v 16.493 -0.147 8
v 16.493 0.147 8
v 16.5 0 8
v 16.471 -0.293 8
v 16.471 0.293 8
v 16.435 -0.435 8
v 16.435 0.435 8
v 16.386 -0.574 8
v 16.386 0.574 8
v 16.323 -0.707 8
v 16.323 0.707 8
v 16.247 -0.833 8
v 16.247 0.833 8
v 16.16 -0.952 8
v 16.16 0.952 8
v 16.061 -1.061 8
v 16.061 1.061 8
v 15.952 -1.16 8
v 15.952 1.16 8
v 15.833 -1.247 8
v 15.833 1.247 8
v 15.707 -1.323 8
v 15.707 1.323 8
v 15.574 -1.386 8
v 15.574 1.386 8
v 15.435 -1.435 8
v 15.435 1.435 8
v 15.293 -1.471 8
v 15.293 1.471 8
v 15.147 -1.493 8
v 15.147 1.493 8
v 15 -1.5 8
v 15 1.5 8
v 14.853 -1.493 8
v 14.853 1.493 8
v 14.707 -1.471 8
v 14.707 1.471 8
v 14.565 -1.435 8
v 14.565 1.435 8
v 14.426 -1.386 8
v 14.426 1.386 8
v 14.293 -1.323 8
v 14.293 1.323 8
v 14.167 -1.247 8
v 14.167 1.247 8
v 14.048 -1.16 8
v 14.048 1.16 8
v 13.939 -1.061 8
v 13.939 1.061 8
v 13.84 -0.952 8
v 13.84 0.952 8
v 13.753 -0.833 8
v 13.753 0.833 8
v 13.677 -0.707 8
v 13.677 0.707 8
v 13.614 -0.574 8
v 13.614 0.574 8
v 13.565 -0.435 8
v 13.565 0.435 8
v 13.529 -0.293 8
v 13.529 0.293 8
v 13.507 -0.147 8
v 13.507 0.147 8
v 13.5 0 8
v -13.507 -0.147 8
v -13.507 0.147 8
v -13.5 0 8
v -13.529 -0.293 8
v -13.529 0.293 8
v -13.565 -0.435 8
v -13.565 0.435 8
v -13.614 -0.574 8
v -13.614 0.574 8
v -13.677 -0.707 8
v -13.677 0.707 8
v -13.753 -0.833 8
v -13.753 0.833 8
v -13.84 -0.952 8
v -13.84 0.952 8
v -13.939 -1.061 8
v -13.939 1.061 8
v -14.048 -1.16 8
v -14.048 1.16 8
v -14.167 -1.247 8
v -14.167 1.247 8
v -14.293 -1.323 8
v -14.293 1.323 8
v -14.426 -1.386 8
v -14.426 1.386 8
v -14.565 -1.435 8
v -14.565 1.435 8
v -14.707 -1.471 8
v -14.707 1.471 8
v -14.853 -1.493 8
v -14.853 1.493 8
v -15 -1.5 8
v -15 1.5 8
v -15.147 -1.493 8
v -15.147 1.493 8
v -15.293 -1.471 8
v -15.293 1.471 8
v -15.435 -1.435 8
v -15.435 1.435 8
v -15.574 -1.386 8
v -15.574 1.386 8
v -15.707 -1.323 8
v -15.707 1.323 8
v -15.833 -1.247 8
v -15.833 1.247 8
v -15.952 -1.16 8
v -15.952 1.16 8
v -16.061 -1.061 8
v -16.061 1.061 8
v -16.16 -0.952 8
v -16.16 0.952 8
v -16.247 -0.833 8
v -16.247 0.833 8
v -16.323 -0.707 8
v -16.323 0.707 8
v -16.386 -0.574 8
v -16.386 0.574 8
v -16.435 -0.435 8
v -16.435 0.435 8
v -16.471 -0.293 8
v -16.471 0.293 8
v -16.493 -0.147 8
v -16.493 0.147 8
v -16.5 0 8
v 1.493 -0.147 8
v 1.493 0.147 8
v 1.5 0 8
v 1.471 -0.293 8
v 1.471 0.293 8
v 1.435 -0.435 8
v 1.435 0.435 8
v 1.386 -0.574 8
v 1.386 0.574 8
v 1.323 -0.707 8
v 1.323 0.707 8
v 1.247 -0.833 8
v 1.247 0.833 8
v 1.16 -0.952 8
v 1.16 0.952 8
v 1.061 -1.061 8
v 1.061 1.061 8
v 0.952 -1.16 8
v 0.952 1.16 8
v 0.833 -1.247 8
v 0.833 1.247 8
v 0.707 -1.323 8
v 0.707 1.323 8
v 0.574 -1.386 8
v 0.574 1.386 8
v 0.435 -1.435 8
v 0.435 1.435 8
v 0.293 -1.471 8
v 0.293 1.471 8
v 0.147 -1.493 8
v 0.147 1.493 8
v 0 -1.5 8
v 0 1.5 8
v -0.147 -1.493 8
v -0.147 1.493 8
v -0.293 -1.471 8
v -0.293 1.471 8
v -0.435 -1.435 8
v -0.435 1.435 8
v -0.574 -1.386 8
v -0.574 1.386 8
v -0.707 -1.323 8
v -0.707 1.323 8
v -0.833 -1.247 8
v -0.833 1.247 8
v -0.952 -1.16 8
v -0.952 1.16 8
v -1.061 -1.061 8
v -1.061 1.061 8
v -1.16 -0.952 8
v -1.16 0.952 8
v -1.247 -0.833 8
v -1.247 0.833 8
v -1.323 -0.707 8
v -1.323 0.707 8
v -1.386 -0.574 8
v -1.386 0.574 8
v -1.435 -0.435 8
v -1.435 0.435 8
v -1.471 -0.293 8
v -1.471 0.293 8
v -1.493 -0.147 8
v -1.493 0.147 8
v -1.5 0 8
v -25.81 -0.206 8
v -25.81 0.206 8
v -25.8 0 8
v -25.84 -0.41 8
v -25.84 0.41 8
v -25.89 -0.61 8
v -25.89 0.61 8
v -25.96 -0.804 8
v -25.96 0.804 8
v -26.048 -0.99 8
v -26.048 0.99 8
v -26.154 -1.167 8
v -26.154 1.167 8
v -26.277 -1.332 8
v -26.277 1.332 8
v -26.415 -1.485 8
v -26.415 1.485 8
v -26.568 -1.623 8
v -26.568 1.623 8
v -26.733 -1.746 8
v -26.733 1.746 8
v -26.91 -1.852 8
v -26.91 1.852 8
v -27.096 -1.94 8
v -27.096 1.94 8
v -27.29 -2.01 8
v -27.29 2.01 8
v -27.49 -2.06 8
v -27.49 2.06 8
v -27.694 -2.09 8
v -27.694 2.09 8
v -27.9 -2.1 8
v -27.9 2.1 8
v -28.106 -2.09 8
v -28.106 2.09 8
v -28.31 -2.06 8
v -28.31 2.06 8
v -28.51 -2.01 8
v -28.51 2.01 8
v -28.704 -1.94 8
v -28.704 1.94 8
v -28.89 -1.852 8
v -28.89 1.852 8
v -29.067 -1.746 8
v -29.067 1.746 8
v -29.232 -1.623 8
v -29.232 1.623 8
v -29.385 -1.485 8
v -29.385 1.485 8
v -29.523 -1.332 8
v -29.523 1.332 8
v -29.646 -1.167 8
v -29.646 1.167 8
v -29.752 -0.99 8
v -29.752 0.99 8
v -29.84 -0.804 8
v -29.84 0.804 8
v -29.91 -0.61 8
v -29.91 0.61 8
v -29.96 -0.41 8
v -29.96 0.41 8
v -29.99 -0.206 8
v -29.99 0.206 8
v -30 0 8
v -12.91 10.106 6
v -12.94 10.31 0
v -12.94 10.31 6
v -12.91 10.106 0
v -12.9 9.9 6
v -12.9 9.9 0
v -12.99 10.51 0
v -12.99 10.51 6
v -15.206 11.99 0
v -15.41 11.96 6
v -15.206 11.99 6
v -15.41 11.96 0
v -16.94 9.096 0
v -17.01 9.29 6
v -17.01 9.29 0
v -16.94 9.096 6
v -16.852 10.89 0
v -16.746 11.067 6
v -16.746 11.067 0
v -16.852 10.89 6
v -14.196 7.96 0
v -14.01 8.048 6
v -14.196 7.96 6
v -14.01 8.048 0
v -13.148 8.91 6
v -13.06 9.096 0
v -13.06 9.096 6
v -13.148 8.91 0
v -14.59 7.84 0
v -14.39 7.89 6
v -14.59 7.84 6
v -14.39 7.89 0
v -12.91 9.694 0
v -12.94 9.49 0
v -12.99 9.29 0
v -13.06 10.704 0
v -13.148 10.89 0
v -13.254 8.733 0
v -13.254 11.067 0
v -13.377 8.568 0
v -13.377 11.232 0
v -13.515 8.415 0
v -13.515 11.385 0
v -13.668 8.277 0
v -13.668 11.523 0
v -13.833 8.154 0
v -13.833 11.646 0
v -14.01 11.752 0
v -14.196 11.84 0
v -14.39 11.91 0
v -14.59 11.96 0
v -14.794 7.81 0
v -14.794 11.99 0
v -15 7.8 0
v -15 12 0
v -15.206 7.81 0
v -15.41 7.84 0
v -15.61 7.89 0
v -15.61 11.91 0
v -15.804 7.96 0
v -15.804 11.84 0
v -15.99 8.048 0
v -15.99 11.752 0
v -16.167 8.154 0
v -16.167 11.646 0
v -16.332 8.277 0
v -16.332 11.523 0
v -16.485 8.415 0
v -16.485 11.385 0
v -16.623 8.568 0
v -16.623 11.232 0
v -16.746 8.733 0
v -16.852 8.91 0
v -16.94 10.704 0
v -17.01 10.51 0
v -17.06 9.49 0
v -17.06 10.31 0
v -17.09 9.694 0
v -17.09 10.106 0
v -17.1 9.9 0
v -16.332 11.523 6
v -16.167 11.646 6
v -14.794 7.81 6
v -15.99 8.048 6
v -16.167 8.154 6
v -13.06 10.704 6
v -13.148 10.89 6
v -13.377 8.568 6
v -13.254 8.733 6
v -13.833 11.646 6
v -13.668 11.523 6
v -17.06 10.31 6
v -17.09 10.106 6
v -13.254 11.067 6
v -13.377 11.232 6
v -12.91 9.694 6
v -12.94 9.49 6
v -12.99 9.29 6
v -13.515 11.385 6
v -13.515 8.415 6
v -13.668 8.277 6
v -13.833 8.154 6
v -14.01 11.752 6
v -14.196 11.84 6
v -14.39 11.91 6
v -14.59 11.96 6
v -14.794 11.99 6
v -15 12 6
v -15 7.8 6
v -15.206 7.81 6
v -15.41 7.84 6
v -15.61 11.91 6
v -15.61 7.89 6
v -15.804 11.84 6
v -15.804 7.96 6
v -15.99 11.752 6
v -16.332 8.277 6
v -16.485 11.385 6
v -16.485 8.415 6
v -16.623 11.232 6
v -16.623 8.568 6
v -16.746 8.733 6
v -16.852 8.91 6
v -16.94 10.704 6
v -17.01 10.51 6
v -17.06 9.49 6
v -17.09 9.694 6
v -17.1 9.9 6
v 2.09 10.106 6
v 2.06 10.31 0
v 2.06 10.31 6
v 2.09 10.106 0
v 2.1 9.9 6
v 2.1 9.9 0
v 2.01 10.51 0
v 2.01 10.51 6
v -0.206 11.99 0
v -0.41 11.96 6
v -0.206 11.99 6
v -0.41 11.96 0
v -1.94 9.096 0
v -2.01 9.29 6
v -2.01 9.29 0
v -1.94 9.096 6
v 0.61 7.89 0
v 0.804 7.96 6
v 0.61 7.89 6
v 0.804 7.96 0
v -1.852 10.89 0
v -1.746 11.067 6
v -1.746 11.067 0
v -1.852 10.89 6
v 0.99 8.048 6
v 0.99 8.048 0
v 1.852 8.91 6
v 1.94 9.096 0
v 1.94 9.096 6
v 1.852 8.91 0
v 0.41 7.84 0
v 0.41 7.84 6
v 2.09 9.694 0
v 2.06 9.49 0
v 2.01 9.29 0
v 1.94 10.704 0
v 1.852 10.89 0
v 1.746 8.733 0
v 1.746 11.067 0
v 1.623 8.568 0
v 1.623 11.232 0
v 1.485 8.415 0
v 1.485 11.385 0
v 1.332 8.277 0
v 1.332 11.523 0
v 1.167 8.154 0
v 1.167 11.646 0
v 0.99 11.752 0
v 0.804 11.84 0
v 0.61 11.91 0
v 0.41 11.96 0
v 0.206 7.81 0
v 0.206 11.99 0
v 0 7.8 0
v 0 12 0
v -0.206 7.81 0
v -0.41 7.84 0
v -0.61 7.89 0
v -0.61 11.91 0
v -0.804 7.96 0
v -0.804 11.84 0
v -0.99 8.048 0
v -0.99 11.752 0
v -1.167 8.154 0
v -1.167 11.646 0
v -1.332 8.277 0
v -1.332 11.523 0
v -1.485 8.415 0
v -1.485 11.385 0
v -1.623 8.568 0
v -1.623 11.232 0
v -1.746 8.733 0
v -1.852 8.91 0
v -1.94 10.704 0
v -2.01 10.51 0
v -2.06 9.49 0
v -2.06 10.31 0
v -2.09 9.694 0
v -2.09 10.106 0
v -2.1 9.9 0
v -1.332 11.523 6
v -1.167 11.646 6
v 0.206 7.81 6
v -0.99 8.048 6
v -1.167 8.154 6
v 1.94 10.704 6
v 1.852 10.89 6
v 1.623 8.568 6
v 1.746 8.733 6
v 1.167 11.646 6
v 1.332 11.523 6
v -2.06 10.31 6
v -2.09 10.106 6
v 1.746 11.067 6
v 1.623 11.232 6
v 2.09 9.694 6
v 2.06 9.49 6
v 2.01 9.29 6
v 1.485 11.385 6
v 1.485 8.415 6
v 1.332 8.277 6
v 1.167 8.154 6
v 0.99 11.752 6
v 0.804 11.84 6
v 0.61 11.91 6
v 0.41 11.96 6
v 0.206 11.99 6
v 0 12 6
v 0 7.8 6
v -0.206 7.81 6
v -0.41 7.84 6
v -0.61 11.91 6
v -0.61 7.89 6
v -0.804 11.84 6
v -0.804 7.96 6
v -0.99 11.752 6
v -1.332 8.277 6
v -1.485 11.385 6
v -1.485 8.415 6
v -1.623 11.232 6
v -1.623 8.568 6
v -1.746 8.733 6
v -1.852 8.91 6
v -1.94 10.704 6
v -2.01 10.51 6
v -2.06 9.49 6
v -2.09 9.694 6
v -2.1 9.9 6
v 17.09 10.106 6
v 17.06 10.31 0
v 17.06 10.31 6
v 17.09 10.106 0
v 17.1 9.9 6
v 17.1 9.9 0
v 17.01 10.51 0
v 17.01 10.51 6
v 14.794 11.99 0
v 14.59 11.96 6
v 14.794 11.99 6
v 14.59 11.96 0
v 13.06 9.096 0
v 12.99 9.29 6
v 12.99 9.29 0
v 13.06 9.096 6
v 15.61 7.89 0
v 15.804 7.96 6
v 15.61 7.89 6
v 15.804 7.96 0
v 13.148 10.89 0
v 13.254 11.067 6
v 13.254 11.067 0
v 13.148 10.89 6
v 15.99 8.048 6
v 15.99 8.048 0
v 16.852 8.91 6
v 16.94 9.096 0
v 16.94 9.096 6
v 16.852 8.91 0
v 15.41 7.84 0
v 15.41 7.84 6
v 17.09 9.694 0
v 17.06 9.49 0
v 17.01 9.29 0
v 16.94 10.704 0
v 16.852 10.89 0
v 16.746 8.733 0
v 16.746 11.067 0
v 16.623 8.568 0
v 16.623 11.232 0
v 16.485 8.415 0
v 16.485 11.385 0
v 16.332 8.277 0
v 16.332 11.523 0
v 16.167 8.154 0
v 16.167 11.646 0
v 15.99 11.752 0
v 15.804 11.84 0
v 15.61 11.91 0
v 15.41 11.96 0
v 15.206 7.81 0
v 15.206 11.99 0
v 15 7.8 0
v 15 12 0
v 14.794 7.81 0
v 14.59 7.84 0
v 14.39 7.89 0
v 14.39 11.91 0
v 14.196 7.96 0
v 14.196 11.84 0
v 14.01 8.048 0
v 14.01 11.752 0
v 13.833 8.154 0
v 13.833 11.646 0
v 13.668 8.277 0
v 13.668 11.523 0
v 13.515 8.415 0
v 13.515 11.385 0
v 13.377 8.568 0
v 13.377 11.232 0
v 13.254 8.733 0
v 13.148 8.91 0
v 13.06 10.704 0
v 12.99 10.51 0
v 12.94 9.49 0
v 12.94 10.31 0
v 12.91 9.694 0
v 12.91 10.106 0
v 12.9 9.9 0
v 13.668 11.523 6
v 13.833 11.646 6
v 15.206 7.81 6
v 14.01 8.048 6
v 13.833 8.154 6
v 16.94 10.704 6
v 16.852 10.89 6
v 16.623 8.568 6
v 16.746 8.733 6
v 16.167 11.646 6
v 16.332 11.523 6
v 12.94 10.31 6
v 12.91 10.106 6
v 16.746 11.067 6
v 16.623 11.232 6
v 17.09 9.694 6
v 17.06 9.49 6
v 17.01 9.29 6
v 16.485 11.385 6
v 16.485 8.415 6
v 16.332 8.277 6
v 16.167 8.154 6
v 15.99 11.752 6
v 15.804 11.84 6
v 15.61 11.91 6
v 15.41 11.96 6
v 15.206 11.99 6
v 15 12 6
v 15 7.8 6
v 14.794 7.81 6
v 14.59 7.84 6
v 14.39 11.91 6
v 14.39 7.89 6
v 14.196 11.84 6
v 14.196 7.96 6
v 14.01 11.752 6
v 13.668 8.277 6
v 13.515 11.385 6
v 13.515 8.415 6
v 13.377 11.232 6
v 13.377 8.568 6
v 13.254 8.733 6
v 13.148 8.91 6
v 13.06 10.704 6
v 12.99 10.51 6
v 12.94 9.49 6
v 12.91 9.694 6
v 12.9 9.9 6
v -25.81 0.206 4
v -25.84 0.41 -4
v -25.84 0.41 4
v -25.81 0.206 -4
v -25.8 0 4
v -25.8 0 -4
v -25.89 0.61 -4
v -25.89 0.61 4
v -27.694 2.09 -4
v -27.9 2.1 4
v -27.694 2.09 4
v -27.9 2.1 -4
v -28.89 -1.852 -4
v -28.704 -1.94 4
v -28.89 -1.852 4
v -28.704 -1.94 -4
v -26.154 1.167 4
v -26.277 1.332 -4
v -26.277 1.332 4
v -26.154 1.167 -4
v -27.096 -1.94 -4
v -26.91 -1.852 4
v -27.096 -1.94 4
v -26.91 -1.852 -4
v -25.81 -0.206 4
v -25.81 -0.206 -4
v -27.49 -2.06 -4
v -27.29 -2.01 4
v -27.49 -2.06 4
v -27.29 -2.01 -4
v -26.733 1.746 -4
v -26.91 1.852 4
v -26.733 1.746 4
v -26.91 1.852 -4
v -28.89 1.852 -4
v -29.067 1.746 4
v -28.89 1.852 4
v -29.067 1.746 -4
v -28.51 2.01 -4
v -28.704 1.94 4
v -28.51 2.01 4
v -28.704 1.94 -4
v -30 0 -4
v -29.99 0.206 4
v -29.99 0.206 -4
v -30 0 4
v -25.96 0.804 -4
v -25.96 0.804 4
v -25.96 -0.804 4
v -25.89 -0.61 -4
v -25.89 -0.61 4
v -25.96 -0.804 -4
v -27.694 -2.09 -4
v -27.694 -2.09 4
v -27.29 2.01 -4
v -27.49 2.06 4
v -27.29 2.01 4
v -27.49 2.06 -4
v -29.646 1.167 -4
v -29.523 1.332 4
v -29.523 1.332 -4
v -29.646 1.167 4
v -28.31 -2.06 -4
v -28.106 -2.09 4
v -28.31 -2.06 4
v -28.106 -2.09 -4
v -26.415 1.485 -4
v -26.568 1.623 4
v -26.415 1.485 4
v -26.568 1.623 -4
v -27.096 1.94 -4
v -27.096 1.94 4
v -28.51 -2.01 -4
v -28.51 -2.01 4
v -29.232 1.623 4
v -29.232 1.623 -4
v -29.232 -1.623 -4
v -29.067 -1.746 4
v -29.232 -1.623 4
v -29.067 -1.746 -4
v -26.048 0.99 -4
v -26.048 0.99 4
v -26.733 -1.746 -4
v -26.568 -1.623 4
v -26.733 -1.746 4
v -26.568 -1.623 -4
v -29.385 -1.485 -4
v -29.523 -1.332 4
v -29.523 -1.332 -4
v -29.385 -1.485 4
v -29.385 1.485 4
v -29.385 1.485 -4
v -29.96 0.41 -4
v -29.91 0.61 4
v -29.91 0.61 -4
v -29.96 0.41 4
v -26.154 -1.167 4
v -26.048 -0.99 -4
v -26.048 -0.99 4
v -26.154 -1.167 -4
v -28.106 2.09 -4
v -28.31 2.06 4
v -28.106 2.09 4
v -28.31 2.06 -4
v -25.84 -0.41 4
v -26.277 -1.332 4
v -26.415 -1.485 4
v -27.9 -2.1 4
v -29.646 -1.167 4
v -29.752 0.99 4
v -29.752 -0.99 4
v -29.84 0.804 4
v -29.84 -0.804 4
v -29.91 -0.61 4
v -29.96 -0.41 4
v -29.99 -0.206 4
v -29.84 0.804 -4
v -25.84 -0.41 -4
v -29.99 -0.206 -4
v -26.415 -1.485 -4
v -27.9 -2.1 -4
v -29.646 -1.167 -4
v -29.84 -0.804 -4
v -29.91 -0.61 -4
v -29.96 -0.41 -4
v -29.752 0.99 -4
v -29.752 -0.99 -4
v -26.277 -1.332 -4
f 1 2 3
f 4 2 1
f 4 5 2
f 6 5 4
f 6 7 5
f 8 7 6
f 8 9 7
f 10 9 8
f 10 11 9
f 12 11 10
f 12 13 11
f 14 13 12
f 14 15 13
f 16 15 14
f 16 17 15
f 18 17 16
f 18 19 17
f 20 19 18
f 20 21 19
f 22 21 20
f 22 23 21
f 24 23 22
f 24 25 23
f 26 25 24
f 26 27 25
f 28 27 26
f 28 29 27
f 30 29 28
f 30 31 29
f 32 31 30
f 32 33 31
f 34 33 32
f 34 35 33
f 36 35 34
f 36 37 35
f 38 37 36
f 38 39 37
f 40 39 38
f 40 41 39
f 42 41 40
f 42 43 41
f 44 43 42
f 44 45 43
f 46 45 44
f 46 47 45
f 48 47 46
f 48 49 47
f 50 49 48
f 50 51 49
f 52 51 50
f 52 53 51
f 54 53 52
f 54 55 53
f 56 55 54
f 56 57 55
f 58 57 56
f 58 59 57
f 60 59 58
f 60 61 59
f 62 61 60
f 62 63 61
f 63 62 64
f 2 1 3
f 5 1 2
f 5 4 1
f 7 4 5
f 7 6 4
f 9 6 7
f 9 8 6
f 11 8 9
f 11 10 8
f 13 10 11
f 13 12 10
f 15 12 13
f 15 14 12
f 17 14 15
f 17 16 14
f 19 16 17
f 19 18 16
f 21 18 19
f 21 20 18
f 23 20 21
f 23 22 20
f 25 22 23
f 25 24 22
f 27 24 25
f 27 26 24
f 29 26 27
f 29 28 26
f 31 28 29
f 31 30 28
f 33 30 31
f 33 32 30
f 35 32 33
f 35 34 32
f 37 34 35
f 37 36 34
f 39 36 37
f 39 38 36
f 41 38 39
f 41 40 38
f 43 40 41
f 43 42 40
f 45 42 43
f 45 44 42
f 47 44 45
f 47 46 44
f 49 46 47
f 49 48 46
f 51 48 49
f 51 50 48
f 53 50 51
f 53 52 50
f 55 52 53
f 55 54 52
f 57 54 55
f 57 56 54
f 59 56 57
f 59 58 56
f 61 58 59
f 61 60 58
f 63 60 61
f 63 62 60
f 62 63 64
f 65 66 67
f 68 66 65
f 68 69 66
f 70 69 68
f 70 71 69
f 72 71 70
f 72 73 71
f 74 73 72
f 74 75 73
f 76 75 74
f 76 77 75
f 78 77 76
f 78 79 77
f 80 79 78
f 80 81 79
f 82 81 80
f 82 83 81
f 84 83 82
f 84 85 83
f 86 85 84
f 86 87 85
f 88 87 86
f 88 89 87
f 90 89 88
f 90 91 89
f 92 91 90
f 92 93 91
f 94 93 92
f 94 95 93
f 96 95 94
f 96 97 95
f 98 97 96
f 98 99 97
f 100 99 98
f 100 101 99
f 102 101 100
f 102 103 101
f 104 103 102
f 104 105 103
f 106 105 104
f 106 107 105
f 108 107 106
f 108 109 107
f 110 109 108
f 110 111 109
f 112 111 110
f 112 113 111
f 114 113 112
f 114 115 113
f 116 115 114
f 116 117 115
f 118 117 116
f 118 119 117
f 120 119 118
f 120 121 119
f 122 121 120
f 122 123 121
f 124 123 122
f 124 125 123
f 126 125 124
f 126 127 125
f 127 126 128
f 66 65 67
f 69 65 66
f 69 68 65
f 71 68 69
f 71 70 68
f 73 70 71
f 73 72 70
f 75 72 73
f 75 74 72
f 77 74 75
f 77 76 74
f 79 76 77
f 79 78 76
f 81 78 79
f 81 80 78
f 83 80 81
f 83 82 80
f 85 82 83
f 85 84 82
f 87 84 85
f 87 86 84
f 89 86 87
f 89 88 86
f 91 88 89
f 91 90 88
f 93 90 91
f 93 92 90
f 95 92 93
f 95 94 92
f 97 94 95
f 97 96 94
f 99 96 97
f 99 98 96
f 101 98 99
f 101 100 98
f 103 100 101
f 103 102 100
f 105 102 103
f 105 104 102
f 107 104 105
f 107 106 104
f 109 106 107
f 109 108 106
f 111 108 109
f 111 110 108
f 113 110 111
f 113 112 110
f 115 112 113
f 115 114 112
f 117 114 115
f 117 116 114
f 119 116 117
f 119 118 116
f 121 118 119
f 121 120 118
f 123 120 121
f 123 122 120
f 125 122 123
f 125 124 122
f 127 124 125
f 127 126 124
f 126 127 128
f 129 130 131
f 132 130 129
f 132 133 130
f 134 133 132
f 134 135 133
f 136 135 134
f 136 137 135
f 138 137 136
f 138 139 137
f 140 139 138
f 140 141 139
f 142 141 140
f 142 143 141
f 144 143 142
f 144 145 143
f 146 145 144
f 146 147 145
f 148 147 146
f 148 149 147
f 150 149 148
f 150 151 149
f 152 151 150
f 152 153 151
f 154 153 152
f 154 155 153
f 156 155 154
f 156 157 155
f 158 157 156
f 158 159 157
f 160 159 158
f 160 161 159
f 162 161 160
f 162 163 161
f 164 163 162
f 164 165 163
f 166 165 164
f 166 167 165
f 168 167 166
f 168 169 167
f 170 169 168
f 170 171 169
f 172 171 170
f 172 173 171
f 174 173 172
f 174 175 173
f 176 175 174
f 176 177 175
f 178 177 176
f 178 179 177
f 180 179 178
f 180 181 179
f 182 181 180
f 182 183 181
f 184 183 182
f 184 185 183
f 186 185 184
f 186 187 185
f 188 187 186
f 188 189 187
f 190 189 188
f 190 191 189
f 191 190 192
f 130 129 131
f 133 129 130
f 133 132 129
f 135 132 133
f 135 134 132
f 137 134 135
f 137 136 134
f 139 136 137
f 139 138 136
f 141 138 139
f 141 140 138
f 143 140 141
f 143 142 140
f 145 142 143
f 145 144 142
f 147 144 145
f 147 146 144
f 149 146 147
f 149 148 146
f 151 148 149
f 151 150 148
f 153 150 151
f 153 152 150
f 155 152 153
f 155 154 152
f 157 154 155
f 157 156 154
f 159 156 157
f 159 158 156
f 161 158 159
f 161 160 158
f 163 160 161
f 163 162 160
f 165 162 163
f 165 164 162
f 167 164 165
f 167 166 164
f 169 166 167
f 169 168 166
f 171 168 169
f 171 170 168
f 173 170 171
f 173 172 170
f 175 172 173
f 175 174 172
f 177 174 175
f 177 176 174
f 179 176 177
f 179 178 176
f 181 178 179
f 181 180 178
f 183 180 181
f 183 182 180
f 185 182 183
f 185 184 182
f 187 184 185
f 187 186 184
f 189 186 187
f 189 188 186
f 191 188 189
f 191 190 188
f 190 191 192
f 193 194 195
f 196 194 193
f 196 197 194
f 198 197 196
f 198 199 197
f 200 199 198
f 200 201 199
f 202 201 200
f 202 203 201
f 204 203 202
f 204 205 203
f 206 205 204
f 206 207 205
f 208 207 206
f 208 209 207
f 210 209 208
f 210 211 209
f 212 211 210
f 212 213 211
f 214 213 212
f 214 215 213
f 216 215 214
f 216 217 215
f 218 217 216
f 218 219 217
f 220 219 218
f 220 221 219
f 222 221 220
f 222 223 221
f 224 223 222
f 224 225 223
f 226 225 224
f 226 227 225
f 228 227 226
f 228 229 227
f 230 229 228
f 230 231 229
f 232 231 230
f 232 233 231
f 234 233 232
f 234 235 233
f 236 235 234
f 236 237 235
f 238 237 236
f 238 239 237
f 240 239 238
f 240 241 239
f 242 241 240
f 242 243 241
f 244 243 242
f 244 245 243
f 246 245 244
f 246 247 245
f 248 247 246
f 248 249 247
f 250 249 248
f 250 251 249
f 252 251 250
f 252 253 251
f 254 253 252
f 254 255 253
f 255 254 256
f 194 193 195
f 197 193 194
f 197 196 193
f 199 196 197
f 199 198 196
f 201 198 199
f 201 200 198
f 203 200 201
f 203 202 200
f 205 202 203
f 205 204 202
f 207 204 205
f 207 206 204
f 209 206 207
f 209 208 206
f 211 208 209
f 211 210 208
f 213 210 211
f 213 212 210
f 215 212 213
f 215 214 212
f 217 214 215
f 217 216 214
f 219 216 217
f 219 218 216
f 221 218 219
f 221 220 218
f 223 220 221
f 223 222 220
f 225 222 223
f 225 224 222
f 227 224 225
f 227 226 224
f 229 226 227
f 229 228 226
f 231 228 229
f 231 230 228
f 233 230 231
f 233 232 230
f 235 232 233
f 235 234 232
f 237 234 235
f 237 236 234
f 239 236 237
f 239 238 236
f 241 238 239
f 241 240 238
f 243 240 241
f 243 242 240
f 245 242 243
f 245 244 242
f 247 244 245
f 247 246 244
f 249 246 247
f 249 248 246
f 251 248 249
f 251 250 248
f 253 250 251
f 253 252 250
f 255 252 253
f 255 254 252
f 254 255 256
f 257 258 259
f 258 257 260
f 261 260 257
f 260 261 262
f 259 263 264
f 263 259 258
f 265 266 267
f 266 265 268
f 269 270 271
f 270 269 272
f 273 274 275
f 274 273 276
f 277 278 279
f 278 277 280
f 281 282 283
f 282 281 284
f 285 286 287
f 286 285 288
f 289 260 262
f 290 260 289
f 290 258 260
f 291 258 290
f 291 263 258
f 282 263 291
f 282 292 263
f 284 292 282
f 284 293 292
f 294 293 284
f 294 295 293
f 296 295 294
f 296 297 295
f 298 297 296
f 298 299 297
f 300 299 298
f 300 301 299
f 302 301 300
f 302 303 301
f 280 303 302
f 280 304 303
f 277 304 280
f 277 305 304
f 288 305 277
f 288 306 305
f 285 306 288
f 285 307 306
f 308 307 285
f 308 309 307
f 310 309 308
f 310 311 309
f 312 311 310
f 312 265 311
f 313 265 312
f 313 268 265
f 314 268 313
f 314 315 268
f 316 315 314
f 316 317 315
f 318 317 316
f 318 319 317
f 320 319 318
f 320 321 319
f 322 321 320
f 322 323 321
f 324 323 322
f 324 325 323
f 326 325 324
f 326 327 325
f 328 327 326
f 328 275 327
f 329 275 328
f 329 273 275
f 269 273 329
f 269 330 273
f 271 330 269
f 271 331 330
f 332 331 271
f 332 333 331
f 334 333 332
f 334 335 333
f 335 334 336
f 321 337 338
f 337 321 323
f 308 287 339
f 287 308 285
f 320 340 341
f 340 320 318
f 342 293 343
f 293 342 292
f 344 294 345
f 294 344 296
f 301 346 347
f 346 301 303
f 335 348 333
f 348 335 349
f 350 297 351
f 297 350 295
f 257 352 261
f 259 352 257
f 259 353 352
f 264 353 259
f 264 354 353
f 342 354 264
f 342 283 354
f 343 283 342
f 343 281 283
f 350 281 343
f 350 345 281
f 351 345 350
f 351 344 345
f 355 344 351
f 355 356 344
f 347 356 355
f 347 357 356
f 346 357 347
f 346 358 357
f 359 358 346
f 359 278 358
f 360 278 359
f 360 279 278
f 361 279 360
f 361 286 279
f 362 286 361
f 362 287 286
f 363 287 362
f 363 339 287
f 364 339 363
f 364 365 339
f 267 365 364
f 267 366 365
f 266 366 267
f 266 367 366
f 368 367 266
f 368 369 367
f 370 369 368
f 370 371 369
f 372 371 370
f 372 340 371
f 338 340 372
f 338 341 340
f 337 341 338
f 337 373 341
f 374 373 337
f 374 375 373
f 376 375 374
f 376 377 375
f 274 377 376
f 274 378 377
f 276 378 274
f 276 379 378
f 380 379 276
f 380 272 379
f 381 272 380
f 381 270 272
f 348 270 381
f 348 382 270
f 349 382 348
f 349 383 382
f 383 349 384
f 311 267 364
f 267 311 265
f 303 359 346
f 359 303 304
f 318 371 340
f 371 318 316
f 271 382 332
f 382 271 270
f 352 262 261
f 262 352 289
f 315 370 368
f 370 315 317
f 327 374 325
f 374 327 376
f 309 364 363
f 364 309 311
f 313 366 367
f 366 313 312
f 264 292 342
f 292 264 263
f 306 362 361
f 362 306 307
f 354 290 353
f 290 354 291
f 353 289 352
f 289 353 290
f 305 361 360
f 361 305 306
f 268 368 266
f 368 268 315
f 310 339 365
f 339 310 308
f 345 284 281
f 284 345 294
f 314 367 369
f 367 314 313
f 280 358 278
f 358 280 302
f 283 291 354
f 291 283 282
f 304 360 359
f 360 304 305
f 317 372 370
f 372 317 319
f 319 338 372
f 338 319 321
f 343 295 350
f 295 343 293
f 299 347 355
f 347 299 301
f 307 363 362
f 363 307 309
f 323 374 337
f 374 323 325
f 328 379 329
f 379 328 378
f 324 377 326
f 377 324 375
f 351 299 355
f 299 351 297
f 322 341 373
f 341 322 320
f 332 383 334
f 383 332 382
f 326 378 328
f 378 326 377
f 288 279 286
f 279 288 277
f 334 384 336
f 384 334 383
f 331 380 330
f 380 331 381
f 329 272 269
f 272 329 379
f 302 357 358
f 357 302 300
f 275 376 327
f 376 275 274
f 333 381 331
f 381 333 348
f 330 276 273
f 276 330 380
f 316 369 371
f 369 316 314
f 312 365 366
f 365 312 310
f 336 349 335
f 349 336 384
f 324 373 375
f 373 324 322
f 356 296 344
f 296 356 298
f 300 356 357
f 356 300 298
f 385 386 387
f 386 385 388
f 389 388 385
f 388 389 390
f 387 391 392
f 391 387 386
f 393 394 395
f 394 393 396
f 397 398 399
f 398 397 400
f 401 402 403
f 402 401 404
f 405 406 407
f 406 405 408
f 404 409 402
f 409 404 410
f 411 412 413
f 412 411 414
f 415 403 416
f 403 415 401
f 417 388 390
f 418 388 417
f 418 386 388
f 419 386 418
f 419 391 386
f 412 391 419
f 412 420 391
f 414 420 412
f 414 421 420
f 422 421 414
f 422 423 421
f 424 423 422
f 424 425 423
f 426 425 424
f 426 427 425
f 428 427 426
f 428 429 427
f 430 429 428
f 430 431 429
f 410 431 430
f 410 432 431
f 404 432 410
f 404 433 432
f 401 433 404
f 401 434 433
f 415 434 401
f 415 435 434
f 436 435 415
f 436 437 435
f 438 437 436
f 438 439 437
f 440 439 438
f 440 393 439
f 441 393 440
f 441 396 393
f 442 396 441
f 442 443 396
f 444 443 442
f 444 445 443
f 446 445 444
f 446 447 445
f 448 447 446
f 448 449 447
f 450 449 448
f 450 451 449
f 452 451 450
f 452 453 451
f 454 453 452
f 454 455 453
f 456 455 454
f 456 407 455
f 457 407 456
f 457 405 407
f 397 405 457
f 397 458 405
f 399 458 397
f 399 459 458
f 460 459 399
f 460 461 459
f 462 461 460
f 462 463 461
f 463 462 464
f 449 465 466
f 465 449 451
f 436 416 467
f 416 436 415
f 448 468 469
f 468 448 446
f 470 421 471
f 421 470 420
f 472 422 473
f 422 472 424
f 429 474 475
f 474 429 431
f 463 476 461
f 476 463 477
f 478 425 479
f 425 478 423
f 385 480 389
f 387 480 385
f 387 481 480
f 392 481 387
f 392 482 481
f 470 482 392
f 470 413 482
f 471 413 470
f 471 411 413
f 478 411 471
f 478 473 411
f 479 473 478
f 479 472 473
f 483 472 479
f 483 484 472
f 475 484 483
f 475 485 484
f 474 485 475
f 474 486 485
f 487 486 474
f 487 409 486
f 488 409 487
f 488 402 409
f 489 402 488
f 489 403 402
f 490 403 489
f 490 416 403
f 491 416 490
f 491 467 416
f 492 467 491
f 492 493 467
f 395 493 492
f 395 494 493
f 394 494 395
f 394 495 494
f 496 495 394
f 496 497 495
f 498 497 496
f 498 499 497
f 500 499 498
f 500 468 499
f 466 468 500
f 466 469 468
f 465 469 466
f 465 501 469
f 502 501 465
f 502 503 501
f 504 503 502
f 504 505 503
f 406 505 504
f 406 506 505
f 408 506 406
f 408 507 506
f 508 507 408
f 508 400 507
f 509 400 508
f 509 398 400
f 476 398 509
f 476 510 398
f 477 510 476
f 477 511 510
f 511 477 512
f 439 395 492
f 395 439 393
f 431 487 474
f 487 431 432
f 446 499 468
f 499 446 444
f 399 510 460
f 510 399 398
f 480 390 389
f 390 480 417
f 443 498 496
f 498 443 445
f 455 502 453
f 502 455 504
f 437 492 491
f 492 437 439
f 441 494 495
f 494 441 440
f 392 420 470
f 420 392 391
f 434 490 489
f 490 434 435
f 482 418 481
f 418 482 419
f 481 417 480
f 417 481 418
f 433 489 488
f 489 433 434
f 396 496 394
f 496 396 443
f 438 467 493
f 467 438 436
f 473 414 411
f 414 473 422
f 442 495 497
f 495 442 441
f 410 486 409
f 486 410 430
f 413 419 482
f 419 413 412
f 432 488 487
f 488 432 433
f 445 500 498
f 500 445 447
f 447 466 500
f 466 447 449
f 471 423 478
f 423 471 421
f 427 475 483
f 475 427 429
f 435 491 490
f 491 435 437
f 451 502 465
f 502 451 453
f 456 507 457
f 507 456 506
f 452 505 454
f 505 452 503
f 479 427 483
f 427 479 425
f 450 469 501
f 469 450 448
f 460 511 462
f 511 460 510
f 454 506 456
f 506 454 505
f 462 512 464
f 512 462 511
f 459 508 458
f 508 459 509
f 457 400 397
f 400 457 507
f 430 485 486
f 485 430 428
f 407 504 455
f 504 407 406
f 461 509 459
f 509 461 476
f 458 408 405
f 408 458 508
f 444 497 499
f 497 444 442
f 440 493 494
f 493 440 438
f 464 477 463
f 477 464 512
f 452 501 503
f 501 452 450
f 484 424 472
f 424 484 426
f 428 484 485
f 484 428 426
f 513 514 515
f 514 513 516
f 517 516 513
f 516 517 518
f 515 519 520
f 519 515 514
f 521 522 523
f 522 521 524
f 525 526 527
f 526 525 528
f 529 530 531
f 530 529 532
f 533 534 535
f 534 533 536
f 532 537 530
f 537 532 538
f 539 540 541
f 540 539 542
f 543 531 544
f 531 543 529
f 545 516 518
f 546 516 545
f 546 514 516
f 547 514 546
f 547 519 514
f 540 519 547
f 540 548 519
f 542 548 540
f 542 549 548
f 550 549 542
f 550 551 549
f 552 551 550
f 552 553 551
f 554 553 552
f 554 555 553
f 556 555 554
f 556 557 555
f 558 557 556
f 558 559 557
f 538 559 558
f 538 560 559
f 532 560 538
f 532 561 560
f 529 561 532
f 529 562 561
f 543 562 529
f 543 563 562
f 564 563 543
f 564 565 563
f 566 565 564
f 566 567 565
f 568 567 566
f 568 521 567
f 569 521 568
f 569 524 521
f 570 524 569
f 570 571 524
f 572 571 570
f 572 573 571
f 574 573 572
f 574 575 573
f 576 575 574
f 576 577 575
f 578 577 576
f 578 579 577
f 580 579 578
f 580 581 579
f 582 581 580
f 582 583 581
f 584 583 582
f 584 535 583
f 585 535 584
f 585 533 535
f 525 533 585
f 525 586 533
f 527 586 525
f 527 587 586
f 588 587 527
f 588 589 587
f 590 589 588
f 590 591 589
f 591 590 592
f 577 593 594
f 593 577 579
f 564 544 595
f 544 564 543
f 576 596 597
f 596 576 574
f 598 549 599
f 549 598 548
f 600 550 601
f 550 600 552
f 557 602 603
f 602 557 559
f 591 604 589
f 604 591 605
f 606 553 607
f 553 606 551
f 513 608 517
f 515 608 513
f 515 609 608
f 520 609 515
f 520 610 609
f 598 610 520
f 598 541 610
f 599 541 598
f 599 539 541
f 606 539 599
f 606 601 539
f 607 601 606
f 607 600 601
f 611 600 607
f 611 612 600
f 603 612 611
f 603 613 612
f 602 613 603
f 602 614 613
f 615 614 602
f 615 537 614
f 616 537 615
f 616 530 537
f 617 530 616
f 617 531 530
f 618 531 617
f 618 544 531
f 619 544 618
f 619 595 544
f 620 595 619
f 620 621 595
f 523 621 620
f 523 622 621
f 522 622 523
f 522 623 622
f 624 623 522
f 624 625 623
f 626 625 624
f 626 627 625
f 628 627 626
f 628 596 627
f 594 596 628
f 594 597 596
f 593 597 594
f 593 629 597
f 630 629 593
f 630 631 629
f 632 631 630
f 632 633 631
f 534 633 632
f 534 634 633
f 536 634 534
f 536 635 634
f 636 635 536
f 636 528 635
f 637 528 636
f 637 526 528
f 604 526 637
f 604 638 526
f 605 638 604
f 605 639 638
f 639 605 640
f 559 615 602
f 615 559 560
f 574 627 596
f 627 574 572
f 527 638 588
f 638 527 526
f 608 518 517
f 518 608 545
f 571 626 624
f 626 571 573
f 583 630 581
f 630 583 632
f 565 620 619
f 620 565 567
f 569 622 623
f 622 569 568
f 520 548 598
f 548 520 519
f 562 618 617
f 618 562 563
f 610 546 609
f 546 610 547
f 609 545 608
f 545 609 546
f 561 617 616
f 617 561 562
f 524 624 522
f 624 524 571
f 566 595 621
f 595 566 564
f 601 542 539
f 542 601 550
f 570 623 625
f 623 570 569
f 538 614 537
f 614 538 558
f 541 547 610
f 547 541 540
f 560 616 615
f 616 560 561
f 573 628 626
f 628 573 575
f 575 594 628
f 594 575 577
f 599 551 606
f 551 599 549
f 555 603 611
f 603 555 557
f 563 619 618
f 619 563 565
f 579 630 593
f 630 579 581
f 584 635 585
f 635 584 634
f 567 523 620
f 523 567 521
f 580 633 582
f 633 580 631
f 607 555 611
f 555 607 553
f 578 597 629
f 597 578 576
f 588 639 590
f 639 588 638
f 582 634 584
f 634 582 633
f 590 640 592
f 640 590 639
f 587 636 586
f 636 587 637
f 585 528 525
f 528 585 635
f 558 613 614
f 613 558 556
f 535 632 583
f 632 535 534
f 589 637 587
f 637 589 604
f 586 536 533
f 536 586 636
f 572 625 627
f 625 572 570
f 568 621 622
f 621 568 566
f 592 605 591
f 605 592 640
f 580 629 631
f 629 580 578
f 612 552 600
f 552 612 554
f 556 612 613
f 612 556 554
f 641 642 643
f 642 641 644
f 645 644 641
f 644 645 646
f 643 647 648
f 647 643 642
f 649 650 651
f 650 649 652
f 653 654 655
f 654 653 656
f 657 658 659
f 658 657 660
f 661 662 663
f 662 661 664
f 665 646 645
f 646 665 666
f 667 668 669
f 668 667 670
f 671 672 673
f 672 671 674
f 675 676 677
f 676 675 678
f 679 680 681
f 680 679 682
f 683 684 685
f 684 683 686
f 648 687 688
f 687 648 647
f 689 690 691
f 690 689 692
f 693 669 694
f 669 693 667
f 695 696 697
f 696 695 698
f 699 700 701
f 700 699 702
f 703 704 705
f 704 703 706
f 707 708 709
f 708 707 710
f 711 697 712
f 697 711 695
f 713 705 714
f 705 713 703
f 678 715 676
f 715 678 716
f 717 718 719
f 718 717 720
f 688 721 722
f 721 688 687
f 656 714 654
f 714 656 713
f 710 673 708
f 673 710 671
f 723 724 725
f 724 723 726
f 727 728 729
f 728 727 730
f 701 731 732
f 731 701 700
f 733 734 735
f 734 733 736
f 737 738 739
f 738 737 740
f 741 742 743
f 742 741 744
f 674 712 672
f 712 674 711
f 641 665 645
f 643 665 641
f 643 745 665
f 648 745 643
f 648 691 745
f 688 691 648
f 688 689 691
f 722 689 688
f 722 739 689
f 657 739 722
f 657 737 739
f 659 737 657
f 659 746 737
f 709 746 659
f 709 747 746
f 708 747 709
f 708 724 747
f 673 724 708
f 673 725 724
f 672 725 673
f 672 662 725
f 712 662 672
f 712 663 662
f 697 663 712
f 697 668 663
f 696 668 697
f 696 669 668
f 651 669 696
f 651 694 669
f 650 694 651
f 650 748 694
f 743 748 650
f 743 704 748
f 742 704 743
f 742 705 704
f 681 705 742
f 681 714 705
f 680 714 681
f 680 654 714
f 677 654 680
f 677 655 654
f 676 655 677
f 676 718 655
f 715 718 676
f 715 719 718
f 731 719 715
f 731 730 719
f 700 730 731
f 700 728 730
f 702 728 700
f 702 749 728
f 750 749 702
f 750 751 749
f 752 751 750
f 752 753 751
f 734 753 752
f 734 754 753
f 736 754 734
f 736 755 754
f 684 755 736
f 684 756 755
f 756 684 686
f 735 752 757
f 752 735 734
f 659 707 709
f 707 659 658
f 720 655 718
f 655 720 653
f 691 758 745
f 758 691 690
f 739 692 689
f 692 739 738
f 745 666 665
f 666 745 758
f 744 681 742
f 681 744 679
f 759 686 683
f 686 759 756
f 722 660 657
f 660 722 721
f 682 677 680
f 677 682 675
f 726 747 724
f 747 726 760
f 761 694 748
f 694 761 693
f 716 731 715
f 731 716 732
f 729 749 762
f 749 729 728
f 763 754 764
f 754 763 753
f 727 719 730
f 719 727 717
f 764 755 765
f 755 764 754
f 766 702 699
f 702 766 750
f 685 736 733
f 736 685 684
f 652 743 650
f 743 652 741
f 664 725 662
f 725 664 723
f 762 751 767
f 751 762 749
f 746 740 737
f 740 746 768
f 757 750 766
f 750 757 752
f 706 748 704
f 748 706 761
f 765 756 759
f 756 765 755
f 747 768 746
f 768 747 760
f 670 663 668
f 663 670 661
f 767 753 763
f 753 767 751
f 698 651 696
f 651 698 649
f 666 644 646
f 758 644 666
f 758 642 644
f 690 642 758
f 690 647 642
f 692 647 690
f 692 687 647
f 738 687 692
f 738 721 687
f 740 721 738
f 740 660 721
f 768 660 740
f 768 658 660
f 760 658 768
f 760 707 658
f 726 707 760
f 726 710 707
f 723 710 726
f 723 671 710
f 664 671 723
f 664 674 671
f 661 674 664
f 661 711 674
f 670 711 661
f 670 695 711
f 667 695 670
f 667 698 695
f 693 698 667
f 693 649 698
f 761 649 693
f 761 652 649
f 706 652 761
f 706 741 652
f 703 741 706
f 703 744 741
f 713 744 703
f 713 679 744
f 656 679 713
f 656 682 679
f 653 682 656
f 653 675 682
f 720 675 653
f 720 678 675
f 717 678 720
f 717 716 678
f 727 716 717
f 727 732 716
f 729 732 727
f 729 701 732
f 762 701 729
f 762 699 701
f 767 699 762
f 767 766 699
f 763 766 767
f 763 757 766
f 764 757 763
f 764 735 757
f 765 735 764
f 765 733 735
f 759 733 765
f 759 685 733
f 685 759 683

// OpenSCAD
// --- Dimensions (mm) ---

// Block dimensions
block_length = 60;   // X dimension
block_width = 24;    // Y dimension
block_height = 16;   // Z dimension

// Tubing/Channel dimensions
tube_diameter = 3.0;  // Diameter of internal channels
inlet_socket_dia = 4.2; // Inlet socket diameter
outlet_socket_dia = 4.2; // Outlet socket diameter
inlet_depth = 8.0;    // Depth of inlet socket
outlet_depth = 6.0;   // Depth of outlet sockets

// Screw hole dimensions
screw_hole_diameter = 3.4; // Diameter for M3 screws
screw_hole_offset_x1 = -25; // X position of first screw hole (relative to center)
screw_hole_offset_x2 = 25;  // X position of second screw hole (relative to center)
screw_hole_y_pos = -6.0;    // Y position of both screw holes

// Channel positions and lengths
main_channel_stop_x = 15; // Where the main channel stops internally
outlet_branch_x1 = -15;  // X position for first outlet branch
outlet_branch_x2 = 0;    // X position for second outlet branch
outlet_branch_x3 = 15;   // X position for third outlet branch

// --- Constants ---
$fn = 64; // High resolution for curves

// --- Base Block ---
module block() {
    cube([block_length, block_width, block_height], center = true);
}

// --- Features ---

// 1. Inlet Socket (on -X face, y=0)
module inlet_socket() {
    translate([-block_length/2 + (inlet_socket_dia / 2), 0, 0]) {
        cylinder(h = inlet_depth, r = inlet_socket_dia / 2, center = true);
    }
}

// 2. Outlet Sockets (on +Y face)
module outlet_socket() {
    // Socket centered at the branch X position, on the Y face (+block_width/2)
    translate([0, block_width/2 - (outlet_socket_dia / 2), 0]) {
        cylinder(h = outlet_depth, r = outlet_socket_dia / 2, center = true);
    }
}

// 3. Internal Channels (Hollowed out)
module internal_channels() {
    difference() {
        // Start with the solid block shape for subtraction reference
        block();

        // A. Main Channel (Runs from inlet area towards X=15, closed inside)
        // The main channel starts near the inlet and runs along X until x = 15.
        // We model this as a cylinder centered on Y=0, Z=8.
        translate([-(block_length/2 - (inlet_socket_dia / 2)), 0, block_height/2]) {
            cylinder(h = main_channel_stop_x + (block_length/2 - (inlet_socket_dia / 2)) , r = tube_diameter / 2);
        }

        // B. Outlet Channels (Branching from X=-15, 0, 15 towards +Y face)
        // These channels run along Y direction until they exit the block boundary at Y=block_width/2.
        for (i = [outlet_branch_x1, outlet_branch_x2, outlet_branch_x3]) {
            translate([i, 0, block_height/2]) {
                // Length needed: from center line (Y=0) to exit face (Y=block_width/2)
                cylinder(h = block_width / 2 + tube_diameter/2 , r = tube_diameter / 2);
            }
        }

        // C. Closing the Main Channel at X=15 (to ensure it's closed inside)
        // This cuts a cap at x = main_channel_stop_x, centered on Y=0, Z=8.
        translate([main_channel_stop_x + block_length/2, 0, block_height/2]) {
            cylinder(h = tube_diameter * 2, r = tube_diameter / 2);
        }

        // D. Inlet Connection Cutout (To allow tubing entry)
        // This removes material where the inlet socket is located, ensuring the main channel starts correctly.
        translate([-block_length/2 + (inlet_socket_dia / 2), 0, block_height/2]) {
            cylinder(h = block_height * 2, r = inlet_socket_dia / 2);
        }

    }
}


// 4. Screw Holes (Vertical through-holes)
module screw_holes() {
    for (i = [screw_hole_offset_x1, screw_hole_offset_x2]) {
        translate([i, screw_hole_y_pos, -block_height/2 - 0.01]) { // Extend slightly past bottom face
            cylinder(h = block_height + 0.02, r = screw_hole_diameter / 2);
        }
    }
}


// --- Final Assembly ---

difference() {
    // Start with the solid block
    block();

    // Subtract all features (channels and holes)
    union() {
        internal_channels();
        screw_holes();
    }

    // Add sockets back in, as they are external fittings that need to be cut into the surface
    // We use a union of the block and the sockets, then subtract the internal channels from this combined shape.
    // However, since we modeled the main body first, we just add the sockets on top of the subtraction result.

    // Re-unioning the base block with the external fittings (sockets) to ensure they are solid features
    union() {
        block();
        inlet_socket();
        // Outlet sockets need to be placed correctly relative to the center origin for the final union
        translate([0, 0, 0]) {
            for (i = [outlet_branch_x1, outlet_branch_x2, outlet_branch_x3]) {
                translate([i, block_width/2 - (outlet_socket_dia / 2), 0]) {
                    cylinder(h = outlet_depth, r = outlet_socket_dia / 2);
                }
            }
        }
    }
}

// Note on the final structure: The difference operation above is complex because sockets are additions to the surface.
// A simpler approach for FDM printing is usually: Solid Block - Internal Cuts + External Features (if they protrude).
// Since the sockets are cut *into* the faces, we must ensure the subtraction process correctly leaves them as holes/sockets.

/*
Revised Final Structure Logic:
1. Start with the solid block.
2. Subtract all internal channels and screw holes from this block.
3. Add the external socket volumes back onto the resulting shape (Union). This ensures the sockets are present on the surface while maintaining the internal cuts.
*/

difference() {
    // 1. Base Block
    block();

    // 2. Subtract Internal Features (Channels and Screw Holes)
    union() {
        internal_channels();
        screw_holes();
    }
}
union() {
    // 3. Add External Sockets back onto the resulting shape
    inlet_socket();

    // Outlet sockets
    for (i = [outlet_branch_x1, outlet_branch_x2, outlet_branch_x3]) {
        translate([i, block_width/2 - (outlet_socket_dia / 2), 0]) {
            cylinder(h = outlet_depth, r = outlet_socket_dia / 2);
        }
    }
}
